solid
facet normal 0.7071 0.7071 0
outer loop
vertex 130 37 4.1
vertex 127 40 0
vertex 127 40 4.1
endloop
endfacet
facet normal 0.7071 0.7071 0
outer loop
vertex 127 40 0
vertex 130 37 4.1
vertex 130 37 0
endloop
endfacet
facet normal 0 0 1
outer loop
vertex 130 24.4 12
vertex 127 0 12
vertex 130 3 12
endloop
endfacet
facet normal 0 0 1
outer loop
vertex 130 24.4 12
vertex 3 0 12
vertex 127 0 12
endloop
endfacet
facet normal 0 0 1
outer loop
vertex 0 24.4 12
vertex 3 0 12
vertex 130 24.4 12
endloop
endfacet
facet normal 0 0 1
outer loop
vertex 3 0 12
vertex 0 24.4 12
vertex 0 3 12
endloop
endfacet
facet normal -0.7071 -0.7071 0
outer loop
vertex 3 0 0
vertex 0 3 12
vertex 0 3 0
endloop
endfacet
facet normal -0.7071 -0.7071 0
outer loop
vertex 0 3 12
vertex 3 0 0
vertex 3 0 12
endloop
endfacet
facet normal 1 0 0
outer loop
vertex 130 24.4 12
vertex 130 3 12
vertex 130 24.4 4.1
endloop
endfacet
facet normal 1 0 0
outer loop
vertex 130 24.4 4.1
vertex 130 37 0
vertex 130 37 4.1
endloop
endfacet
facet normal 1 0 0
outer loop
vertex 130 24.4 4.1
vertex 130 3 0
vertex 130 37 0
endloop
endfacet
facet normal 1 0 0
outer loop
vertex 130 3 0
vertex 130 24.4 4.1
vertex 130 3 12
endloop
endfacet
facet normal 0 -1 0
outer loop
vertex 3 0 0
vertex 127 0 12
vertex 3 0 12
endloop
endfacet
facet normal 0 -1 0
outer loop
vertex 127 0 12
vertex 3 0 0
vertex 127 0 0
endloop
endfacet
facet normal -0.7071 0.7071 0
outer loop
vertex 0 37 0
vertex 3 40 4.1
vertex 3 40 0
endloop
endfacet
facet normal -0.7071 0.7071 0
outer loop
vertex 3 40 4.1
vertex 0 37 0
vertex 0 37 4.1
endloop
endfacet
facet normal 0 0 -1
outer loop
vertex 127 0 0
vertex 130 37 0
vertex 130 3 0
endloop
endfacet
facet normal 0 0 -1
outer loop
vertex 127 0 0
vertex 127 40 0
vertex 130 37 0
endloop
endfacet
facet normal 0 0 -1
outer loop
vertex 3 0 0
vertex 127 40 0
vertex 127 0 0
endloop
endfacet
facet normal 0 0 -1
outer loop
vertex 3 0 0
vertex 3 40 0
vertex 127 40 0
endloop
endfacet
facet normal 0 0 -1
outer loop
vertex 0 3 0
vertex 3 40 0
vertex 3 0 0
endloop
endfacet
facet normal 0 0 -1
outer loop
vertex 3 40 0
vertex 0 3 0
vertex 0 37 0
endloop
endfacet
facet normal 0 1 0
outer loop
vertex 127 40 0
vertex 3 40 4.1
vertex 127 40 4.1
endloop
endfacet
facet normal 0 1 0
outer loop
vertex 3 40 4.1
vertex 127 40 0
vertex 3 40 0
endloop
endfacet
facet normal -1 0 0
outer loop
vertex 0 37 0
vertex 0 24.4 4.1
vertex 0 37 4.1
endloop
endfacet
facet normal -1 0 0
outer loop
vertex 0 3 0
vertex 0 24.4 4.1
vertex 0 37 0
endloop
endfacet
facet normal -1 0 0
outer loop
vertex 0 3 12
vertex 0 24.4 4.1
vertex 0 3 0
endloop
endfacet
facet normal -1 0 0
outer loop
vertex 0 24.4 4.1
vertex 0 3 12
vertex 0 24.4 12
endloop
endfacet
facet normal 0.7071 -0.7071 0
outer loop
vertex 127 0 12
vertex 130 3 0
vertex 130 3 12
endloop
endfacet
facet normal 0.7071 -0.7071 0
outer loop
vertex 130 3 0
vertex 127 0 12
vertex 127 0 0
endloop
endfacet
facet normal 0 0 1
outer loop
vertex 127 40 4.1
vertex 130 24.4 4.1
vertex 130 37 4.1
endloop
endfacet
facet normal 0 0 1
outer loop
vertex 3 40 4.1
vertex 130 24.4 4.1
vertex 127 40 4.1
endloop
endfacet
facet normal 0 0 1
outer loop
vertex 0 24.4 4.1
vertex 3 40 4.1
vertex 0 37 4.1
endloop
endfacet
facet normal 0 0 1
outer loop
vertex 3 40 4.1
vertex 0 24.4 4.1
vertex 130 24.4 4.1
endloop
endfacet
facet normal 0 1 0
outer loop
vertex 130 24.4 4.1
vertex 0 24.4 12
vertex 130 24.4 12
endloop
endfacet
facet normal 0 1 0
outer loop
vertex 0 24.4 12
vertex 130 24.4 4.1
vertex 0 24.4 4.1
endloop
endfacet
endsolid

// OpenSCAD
$fn = 32;

// ----------------------------------------------------------------------
// Stepped bar: sidestep, 130 x 40 x 12/4.1 mm
// ----------------------------------------------------------------------

// --- parameters (mm) ---
bar_l = 130;              // bar length, X
bar_w = 40;               // bar width, Y
plate_t = 12;             // thickness of the thick zone, Z
thin_t = 4.1;             // thickness of the thin zone
corner_c = 3;             // corner chamfer of the bar
step_cut = 7.9;           // material removed from the thin zone
ledge_y = 24.4;           // start of the ledge from the front edge
depth_1 = 7.9;            // depth of cut 1 from the top face

profile = [[3, 0], [127, 0], [130, 3], [130, 37], [127, 40], [3, 40], [0, 37], [0, 3]];  // primary outline, 8 points, counter clockwise
void_1 = [[-1, 24.4], [131, 24.4], [131, 41], [-1, 41]];  // ledge cut along one edge, 4 points

// --- the one profile operation ---
difference() {
  linear_extrude(height = plate_t) polygon(points = profile);
  translate([0, 0, plate_t - depth_1])
    linear_extrude(height = depth_1 + 1) polygon(points = void_1);
}
